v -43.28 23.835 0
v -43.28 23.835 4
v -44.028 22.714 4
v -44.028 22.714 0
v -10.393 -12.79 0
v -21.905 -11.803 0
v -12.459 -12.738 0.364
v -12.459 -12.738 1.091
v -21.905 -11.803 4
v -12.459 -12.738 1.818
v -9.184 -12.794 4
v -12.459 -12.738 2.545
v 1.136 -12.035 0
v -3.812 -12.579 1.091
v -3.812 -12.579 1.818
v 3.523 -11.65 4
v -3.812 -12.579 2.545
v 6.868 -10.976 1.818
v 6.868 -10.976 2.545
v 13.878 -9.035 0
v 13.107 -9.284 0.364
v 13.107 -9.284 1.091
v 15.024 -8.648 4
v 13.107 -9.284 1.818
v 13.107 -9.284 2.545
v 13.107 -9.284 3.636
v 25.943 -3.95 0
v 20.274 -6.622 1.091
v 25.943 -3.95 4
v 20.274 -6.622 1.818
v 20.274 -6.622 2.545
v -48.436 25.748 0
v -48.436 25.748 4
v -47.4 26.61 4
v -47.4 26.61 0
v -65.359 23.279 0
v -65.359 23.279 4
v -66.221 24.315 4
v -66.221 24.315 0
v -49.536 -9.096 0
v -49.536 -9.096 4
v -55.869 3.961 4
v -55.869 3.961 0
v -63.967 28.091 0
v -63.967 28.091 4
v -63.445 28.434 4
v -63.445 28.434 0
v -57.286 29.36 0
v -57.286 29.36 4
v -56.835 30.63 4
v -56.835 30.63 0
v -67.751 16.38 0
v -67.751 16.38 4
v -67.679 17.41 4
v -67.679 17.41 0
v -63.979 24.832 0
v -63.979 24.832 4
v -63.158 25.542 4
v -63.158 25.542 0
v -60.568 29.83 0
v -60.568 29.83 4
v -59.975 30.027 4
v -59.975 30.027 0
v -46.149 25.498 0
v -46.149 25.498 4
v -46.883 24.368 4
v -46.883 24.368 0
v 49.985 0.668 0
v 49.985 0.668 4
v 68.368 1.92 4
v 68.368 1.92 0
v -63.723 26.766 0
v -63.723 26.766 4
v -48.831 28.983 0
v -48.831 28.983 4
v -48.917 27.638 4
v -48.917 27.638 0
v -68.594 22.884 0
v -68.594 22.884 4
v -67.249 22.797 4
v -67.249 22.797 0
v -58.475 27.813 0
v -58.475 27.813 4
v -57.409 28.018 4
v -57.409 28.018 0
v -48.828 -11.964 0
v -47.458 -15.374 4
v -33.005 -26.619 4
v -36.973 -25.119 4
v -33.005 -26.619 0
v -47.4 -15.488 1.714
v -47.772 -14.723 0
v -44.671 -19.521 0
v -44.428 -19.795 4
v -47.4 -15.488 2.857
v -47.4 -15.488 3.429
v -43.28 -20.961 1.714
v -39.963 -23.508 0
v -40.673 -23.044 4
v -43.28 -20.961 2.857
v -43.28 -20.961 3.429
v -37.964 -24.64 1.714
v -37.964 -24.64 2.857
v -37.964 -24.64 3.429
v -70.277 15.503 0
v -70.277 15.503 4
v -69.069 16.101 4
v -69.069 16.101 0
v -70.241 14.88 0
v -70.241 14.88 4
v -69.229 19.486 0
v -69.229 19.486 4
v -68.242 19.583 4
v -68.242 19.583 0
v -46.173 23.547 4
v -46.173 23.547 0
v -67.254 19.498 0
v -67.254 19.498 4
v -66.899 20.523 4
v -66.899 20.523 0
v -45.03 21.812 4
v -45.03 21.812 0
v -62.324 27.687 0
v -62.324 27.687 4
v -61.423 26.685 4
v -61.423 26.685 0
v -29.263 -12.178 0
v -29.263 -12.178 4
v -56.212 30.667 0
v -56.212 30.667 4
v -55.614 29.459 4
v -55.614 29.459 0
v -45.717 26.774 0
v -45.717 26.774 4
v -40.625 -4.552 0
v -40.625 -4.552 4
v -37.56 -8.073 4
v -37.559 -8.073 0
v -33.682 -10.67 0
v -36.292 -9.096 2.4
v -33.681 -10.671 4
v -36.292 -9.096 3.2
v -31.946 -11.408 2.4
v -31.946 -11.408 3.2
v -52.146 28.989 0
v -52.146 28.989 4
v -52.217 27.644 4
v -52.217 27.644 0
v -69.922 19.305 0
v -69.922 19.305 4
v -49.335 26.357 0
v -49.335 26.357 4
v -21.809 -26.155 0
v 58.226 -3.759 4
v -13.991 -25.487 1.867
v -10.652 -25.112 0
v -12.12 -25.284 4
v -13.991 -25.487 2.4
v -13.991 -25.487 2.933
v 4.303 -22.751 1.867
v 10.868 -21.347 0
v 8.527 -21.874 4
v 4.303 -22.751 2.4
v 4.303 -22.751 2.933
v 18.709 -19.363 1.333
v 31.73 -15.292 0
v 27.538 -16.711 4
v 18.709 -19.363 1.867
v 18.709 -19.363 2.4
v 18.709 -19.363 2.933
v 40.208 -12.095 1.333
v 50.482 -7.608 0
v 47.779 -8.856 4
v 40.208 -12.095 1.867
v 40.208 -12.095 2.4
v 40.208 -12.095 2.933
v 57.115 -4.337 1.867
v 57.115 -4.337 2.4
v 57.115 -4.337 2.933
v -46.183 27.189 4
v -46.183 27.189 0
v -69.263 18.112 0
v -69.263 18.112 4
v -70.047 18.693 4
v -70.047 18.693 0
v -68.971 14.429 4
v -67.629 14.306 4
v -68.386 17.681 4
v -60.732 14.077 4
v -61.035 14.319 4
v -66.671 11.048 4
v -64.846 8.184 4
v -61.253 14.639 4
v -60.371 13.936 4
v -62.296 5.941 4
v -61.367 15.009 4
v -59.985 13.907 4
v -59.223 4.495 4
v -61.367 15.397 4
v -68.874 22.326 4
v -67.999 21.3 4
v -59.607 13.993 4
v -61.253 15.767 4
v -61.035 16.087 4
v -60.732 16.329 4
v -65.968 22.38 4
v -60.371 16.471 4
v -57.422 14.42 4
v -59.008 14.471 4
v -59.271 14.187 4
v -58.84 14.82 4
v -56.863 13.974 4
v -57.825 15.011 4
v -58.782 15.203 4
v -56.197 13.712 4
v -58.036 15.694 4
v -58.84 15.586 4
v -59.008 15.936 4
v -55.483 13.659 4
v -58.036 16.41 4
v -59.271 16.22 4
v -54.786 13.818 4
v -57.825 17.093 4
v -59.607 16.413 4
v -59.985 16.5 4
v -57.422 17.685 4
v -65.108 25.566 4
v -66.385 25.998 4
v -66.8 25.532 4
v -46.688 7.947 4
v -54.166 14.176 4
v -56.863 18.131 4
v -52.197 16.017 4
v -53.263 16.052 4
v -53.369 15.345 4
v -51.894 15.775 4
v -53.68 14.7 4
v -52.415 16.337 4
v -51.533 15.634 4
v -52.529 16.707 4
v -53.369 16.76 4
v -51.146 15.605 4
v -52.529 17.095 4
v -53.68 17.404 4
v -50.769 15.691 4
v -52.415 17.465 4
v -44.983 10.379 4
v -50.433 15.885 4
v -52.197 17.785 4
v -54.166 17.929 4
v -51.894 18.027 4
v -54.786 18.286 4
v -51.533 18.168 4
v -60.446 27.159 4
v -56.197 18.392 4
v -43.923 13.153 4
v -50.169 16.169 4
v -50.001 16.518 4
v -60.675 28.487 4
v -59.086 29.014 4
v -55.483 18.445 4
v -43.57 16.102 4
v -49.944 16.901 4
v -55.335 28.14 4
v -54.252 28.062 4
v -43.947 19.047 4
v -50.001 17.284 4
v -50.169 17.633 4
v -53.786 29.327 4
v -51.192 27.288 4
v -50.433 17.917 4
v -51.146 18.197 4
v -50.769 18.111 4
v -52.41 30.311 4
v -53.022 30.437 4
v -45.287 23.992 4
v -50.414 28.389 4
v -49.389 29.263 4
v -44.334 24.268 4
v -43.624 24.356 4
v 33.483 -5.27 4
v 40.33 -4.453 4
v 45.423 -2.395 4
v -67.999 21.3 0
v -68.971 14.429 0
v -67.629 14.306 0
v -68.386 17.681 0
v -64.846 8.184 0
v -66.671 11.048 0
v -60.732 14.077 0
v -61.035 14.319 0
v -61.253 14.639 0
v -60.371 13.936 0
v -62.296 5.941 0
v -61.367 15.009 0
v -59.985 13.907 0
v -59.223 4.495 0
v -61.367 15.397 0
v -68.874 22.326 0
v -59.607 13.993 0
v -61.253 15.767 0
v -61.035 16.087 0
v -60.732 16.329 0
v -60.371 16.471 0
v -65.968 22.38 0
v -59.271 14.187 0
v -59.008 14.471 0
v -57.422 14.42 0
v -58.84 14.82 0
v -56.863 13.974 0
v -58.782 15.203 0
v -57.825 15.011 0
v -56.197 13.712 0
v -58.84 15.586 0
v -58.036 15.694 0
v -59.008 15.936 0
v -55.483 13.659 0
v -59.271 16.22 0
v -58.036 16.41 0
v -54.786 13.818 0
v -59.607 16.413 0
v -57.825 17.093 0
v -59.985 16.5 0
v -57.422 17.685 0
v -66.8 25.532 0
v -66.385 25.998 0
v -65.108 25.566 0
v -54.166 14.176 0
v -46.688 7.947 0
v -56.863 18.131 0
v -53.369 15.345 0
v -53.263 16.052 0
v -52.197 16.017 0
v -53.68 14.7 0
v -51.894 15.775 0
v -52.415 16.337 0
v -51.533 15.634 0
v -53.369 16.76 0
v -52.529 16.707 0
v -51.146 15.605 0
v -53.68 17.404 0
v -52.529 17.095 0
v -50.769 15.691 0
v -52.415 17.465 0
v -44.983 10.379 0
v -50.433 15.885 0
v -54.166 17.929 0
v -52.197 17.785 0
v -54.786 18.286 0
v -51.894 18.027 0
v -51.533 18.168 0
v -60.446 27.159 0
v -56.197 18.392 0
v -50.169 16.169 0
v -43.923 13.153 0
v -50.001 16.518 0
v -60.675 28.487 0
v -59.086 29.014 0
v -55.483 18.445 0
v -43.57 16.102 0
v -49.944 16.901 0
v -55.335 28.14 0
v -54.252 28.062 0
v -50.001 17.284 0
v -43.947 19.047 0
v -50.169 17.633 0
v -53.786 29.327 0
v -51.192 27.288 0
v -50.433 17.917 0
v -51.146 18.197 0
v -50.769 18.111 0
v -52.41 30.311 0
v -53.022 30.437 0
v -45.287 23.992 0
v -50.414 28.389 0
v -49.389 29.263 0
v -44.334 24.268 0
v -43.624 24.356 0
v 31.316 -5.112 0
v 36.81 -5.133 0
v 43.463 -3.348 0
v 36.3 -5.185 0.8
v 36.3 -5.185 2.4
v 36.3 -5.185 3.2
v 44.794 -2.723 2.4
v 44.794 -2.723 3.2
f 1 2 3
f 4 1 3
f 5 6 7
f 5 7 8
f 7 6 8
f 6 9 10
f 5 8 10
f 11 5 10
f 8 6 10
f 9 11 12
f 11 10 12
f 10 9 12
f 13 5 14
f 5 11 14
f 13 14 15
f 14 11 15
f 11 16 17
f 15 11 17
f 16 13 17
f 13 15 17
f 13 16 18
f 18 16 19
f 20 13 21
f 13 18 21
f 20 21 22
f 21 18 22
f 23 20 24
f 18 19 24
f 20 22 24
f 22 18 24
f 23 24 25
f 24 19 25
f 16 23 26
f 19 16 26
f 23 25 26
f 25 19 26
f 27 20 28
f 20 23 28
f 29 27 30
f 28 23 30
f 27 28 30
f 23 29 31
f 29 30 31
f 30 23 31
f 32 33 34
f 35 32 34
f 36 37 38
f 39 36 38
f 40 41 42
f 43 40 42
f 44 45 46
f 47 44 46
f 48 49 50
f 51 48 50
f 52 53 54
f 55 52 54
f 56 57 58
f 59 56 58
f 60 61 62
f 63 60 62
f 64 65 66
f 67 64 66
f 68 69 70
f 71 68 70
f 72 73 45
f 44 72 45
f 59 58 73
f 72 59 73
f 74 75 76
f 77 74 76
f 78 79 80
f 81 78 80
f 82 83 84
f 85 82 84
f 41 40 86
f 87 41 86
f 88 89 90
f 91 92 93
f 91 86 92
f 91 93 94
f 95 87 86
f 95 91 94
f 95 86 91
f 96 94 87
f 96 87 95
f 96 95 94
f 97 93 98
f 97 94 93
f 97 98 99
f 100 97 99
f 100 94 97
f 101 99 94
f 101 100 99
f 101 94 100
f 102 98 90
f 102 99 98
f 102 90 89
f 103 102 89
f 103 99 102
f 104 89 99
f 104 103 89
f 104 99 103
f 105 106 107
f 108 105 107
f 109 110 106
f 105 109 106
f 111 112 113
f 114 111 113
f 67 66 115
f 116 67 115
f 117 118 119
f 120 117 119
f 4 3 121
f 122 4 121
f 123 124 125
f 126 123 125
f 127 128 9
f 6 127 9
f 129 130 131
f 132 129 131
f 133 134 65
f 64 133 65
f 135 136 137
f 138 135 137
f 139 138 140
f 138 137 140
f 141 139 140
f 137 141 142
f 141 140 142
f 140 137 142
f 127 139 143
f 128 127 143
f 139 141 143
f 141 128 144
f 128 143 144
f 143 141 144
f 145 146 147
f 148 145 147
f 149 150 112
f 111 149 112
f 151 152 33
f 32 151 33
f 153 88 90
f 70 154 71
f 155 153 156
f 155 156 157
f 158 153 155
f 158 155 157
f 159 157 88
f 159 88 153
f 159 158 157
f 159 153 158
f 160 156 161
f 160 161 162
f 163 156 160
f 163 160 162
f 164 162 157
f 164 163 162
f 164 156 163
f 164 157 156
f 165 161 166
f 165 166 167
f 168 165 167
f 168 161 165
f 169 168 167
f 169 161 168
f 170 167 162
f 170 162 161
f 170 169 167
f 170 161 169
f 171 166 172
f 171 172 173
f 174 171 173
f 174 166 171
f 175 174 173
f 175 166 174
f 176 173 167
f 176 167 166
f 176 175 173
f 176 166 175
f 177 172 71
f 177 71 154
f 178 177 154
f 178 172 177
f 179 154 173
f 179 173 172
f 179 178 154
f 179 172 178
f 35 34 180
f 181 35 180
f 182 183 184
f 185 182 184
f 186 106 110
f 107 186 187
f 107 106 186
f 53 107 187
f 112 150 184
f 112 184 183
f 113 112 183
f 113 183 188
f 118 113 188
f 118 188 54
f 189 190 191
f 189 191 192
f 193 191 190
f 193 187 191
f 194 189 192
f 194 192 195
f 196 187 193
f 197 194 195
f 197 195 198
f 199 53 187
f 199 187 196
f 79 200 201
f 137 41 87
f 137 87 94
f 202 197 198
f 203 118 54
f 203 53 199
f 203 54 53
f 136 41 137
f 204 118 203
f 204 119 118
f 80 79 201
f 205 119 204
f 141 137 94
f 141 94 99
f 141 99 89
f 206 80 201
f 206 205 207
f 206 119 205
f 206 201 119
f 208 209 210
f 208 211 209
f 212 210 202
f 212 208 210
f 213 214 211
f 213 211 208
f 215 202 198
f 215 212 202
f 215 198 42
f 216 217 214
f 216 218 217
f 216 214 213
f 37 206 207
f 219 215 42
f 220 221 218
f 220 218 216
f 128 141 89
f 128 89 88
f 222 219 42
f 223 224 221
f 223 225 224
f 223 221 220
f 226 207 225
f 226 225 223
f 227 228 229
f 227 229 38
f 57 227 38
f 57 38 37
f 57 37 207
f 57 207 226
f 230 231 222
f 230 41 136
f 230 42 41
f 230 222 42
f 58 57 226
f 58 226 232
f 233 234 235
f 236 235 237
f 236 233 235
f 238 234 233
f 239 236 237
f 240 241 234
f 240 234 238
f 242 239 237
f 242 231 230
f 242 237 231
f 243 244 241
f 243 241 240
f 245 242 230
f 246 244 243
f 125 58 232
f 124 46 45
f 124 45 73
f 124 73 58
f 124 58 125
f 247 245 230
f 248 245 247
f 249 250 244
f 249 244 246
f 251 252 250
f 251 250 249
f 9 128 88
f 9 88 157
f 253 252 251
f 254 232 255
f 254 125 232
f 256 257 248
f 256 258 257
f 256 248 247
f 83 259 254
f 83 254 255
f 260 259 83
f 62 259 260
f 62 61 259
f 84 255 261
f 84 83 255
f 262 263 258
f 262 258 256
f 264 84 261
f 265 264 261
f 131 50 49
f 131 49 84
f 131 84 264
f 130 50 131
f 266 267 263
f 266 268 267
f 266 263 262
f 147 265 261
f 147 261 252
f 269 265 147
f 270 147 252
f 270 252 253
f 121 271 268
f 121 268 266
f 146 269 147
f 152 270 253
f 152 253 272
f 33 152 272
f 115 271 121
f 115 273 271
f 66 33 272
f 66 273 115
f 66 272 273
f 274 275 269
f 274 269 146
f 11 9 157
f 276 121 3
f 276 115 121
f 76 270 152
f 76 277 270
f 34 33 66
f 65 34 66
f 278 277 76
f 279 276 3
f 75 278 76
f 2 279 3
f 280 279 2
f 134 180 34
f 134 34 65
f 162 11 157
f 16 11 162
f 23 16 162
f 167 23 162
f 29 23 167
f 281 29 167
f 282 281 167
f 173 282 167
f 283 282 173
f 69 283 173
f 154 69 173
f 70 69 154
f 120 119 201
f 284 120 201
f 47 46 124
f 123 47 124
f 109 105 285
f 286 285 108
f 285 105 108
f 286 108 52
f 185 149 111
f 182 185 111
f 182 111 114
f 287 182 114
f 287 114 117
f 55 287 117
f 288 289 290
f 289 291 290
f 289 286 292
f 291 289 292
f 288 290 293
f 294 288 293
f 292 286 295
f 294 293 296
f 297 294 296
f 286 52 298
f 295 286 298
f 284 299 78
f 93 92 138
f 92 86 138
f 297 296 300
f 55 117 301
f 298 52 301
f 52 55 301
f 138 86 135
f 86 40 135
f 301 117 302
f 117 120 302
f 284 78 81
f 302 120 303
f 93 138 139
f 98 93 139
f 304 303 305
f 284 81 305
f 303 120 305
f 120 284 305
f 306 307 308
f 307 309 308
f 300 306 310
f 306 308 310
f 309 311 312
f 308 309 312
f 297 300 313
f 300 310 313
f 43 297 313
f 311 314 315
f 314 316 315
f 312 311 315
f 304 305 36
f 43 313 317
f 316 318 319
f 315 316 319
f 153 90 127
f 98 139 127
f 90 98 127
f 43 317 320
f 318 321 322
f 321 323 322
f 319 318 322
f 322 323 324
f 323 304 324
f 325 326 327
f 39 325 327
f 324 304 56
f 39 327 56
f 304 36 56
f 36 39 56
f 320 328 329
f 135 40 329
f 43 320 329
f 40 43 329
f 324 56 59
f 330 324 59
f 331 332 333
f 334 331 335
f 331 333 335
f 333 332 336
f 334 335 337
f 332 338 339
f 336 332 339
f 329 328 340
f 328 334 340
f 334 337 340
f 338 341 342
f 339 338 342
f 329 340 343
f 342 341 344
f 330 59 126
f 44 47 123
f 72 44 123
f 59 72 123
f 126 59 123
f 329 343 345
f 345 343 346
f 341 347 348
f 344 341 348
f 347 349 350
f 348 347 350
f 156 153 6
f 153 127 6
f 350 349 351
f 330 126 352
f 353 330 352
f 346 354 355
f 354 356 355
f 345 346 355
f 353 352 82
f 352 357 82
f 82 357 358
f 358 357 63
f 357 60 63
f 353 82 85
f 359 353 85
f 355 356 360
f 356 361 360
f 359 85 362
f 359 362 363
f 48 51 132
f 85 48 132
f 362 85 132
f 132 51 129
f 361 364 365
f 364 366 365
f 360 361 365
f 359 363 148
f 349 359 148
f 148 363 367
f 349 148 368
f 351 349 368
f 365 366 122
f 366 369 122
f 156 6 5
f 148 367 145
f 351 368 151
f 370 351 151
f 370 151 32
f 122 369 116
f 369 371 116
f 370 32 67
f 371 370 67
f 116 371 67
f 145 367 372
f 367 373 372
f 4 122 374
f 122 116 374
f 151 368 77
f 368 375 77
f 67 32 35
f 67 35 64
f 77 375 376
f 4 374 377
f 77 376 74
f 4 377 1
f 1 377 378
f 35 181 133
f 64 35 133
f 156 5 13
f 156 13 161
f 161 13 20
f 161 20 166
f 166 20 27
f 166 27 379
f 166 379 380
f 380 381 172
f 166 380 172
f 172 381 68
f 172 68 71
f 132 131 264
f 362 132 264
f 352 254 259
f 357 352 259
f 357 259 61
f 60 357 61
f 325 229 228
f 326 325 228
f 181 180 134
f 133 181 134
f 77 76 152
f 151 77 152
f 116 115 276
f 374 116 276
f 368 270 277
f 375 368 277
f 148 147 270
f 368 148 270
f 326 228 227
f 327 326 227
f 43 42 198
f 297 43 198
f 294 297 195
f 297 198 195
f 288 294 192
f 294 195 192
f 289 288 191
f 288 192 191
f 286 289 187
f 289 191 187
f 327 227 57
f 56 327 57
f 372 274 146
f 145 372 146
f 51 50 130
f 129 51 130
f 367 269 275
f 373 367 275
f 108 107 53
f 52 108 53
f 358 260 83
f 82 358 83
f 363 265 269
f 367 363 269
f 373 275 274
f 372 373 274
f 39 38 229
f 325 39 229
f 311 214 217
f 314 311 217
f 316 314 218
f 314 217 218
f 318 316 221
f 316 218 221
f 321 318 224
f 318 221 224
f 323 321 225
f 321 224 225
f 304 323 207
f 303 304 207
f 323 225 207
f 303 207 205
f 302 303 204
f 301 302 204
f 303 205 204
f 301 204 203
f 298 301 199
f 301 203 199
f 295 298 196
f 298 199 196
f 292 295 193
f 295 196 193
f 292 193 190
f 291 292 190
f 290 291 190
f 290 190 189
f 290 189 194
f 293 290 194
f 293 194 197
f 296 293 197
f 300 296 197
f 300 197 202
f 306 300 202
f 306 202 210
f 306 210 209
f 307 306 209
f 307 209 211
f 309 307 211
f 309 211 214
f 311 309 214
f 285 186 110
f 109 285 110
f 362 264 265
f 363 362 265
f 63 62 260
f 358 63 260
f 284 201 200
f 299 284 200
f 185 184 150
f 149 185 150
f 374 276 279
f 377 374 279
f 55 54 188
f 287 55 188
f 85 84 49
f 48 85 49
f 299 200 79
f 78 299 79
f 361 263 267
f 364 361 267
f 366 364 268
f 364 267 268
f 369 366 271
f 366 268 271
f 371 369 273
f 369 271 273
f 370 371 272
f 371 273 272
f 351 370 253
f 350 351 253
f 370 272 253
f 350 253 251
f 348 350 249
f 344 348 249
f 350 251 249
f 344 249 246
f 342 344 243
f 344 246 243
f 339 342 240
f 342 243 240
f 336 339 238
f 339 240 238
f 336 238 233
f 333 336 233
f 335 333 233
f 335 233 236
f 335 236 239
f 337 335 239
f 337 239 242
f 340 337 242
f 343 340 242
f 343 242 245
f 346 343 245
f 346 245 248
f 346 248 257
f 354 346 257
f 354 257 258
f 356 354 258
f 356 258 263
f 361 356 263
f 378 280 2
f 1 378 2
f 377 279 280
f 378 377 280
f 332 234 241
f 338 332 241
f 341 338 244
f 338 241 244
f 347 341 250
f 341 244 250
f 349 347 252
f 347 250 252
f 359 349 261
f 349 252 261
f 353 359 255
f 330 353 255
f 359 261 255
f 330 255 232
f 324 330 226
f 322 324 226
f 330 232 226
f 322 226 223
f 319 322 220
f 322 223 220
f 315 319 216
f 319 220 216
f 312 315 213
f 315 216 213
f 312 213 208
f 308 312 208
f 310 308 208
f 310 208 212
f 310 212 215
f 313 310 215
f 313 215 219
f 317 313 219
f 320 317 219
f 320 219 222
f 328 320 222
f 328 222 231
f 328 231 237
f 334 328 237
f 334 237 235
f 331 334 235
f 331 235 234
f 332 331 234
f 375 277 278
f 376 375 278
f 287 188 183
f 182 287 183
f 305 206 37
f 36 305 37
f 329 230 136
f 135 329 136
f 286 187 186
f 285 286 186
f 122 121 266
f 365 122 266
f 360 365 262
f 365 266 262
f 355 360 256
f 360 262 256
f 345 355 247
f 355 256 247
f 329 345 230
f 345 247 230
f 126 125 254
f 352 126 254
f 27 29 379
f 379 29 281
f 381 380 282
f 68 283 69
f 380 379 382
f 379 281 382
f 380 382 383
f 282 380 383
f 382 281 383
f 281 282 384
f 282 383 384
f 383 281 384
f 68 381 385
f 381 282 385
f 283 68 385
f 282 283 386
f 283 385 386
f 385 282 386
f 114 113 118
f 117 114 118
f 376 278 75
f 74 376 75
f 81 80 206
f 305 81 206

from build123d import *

# Parameters (mm, degrees)
SKETCH1_W           = 150
SKETCH1_H           = 70
BOSS_EXTRUDE1_DEPTH = 4
SKETCH2_W           = 150
SKETCH2_H           = 70
SKETCH2_R           = 1.3
SKETCH2_R_2         = 2.4
CUT_EXTRUDE1_DEPTH  = 10


with BuildPart() as part:
    # Sketch1 → Boss-Extrude1 (new body)
    with BuildSketch(Plane.XY):
        Rectangle(SKETCH1_W, SKETCH1_H)
    extrude(amount=BOSS_EXTRUDE1_DEPTH)

    # Sketch2 → Cut-Extrude1 (cut)
    # profile 1 of 4: a face of its own
    with BuildSketch(Plane.XY.offset(4)):
        Rectangle(SKETCH2_W, SKETCH2_H)
        with BuildLine():
            add(Edge.make_bspline(
                [(25.943186653, -3.950471355), (27.846969269, -4.547232813), (31.287122421, -5.290525852), (36.735640075, -5.338112806), (41.143250704, -4.366496225), (45.771671446, -2.369991596), (48.378055128, -0.634767364), (49.984542654, 0.667670418)],
                knots=[0, 0, 0, 0, 0.234141345, 0.410073985, 0.635494837, 0.757255977, 1, 1, 1, 1], degree=3))
            Line((49.984542654, 0.667670418), (68.368403063, 1.920292741))
            add(Edge.make_bspline(
                [(-33.004955139, -26.618623378), (-30.294523128, -26.574879913), (-25.880509709, -26.423954366), (-19.54201722, -26.014521717), (-14.319937046, -25.543432562), (-8.998131049, -24.92772797), (-2.890101028, -24.067514059), (4.364427962, -22.796901426), (11.870157255, -21.159659498), (19.827939937, -19.110263295), (26.884456831, -16.979260605), (34.037553038, -14.503385048), (39.936366025, -12.243402206), (45.782494162, -9.778756125), (51.423398212, -7.197801789), (59.009760326, -3.437427178), (64.682537278, -0.280517491), (68.368403063, 1.920292741)],
                knots=[0, 0, 0, 0, 0.076324938, 0.124331496, 0.178823517, 0.223936737, 0.275160112, 0.352480577, 0.431247301, 0.491394905, 0.583819579, 0.638693956, 0.704497251, 0.761639539, 0.81730198, 0.879134072, 1, 1, 1, 1], degree=3))
            add(Edge.make_bspline(
                [(-49.535748672, -9.096126268), (-49.339830369, -10.137896023), (-48.797352048, -12.328019472), (-47.539705157, -15.420109206), (-45.707187417, -18.401147763), (-43.54343584, -20.831673927), (-40.91315221, -22.974076428), (-37.51630052, -25.005074849), (-34.707117005, -26.096270898), (-33.004955139, -26.618623378)],
                knots=[0, 0, 0, 0, 0.124884489, 0.26543712, 0.391415345, 0.535530604, 0.646519487, 0.79009791, 1, 1, 1, 1], degree=3))
            Line((-49.535748672, -9.096126268), (-55.868573385, 3.961128214))
            ThreePointArc((-55.868573385, 3.961128214), (-63.649841308, 6.972432766), (-67.628790007, 14.306193932))
            Line((-67.628790007, 14.306193932), (-68.970840738, 14.428927947))
            Line((-68.970840738, 14.428927947), (-70.240707474, 14.880151039))
            Line((-70.240707474, 14.880151039), (-70.277437725, 15.5032436))
            Line((-70.277437725, 15.5032436), (-69.069379214, 16.10053619))
            Line((-69.069379214, 16.10053619), (-67.751042994, 16.380095513))
            Line((-67.751042994, 16.380095513), (-67.679030495, 17.409843403))
            Line((-67.679030495, 17.409843403), (-68.386470931, 17.681135001))
            Line((-68.386470931, 17.681135001), (-69.26282403, 18.111750468))
            Line((-69.26282403, 18.111750468), (-70.047304849, 18.693140424))
            Line((-70.047304849, 18.693140424), (-69.921515326, 19.304508109))
            Line((-69.921515326, 19.304508109), (-69.22879013, 19.48592239))
            Line((-69.22879013, 19.48592239), (-68.242063209, 19.582780663))
            Line((-68.242063209, 19.582780663), (-67.254259433, 19.497602945))
            Line((-67.254259433, 19.497602945), (-66.898609662, 20.523128894))
            Line((-66.898609662, 20.523128894), (-67.999492681, 21.300445035))
            Line((-67.999492681, 21.300445035), (-68.873617988, 22.326149063))
            Line((-68.873617988, 22.326149063), (-68.593881038, 22.884128176))
            Line((-68.593881038, 22.884128176), (-67.249025383, 22.797369477))
            Line((-67.249025383, 22.797369477), (-65.967533065, 22.380306842))
            Line((-65.967533065, 22.380306842), (-65.358576119, 23.278839907))
            Line((-65.358576119, 23.278839907), (-66.220763237, 24.314599134))
            Line((-66.220763237, 24.314599134), (-66.799631709, 25.531593422))
            Line((-66.799631709, 25.531593422), (-66.385010944, 25.998158608))
            Line((-66.385010944, 25.998158608), (-65.108434938, 25.566281883))
            Line((-65.108434938, 25.566281883), (-63.978552164, 24.831755694))
            Line((-63.978552164, 24.831755694), (-63.157787454, 25.542062333))
            Line((-63.157787454, 25.542062333), (-63.722522044, 26.765679367))
            Line((-63.722522044, 26.765679367), (-63.966684751, 28.091027765))
            Line((-63.966684751, 28.091027765), (-63.44543589, 28.434383377))
            Line((-63.44543589, 28.434383377), (-62.324136078, 27.686820312))
            Line((-62.324136078, 27.686820312), (-61.422862493, 26.684887316))
            Line((-61.422862493, 26.684887316), (-60.446223776, 27.158561304))
            Line((-60.446223776, 27.158561304), (-60.675020109, 28.486648666))
            Line((-60.675020109, 28.486648666), (-60.567837768, 29.830030872))
            Line((-60.567837768, 29.830030872), (-59.975483059, 30.026777792))
            Line((-59.975483059, 30.026777792), (-59.08587417, 29.014473574))
            Line((-59.08587417, 29.014473574), (-58.474630079, 27.813413848))
            Line((-58.474630079, 27.813413848), (-57.40867367, 28.018175086))
            Line((-57.40867367, 28.018175086), (-57.285939655, 29.360225818))
            Line((-57.285939655, 29.360225818), (-56.834716563, 30.630092553))
            Line((-56.834716563, 30.630092553), (-56.211624002, 30.666822805))
            Line((-56.211624002, 30.666822805), (-55.614331412, 29.458764294))
            Line((-55.614331412, 29.458764294), (-55.334772089, 28.140428074))
            Line((-55.334772089, 28.140428074), (-54.252141156, 28.062322422))
            Line((-54.252141156, 28.062322422), (-53.786240912, 29.326877983))
            Line((-53.786240912, 29.326877983), (-53.021727178, 30.436689929))
            Line((-53.021727178, 30.436689929), (-52.410359493, 30.310900406))
            Line((-52.410359493, 30.310900406), (-52.146087704, 28.989414792))
            Line((-52.146087704, 28.989414792), (-52.217264657, 27.643644513))
            Line((-52.217264657, 27.643644513), (-51.191738708, 27.287994742))
            Line((-51.191738708, 27.287994742), (-50.414422567, 28.388877761))
            Line((-50.414422567, 28.388877761), (-49.388718539, 29.263003067))
            Line((-49.388718539, 29.263003067), (-48.830739426, 28.983266117))
            Line((-48.830739426, 28.983266117), (-48.917498125, 27.638410463))
            Line((-48.917498125, 27.638410463), (-49.33456076, 26.356918144))
            Line((-49.33456076, 26.356918144), (-48.436027695, 25.747961199))
            Line((-48.436027695, 25.747961199), (-47.400268467, 26.610148317))
            Line((-47.400268467, 26.610148317), (-46.18327418, 27.189016789))
            Line((-46.18327418, 27.189016789), (-45.716708994, 26.774396023))
            Line((-45.716708994, 26.774396023), (-46.148585719, 25.497820017))
            Line((-46.148585719, 25.497820017), (-46.883111907, 24.367937244))
            Line((-46.883111907, 24.367937244), (-46.172805269, 23.547172533))
            Line((-46.172805269, 23.547172533), (-45.286864939, 23.992280694))
            Line((-45.286864939, 23.992280694), (-44.334478382, 24.26790977))
            Line((-44.334478382, 24.26790977), (-43.623839837, 24.356069831))
            Line((-43.623839837, 24.356069831), (-43.280484225, 23.83482097))
            Line((-43.280484225, 23.83482097), (-44.02804729, 22.713521158))
            Line((-44.02804729, 22.713521158), (-45.029980286, 21.812247573))
            ThreePointArc((-45.029980286, 21.812247573), (-43.655526666, 14.616368623), (-46.687860181, 7.947429421))
            Line((-46.687860181, 7.947429421), (-40.625414849, -4.552346756))
            add(Edge.make_bspline(
                [(-40.625414849, -4.552346756), (-39.969724138, -5.518615353), (-38.642033006, -7.159979255), (-36.383256782, -9.119344727), (-34.181437855, -10.482492748), (-31.814725419, -11.517519607), (-30.173224961, -11.982812896), (-29.2632985, -12.178103902)],
                knots=[0, 0, 0, 0, 0.249608299, 0.449336056, 0.636249607, 0.801036873, 1, 1, 1, 1], degree=3))
            Line((-29.2632985, -12.178103902), (-21.905328426, -11.80268597))
            add(Edge.make_bspline(
                [(-21.905328426, -11.80268597), (-20.310852996, -12.055092712), (-17.169889797, -12.459787879), (-12.483928013, -12.782767249), (-8.045859096, -12.82243272), (-3.649062985, -12.608578219), (1.283313279, -12.08050338), (5.938716144, -11.233581759), (10.05540984, -10.206537199), (13.081948519, -9.312895411), (16.474512339, -8.1639354), (20.793643696, -6.464082533), (24.086370836, -4.909244471), (25.943186653, -3.950471355)],
                knots=[0, 0, 0, 0, 0.098157301, 0.192485818, 0.285432427, 0.367865586, 0.460021268, 0.586889267, 0.655198895, 0.717943591, 0.778718956, 0.872950297, 1, 1, 1, 1], degree=3))
        make_face(mode=Mode.SUBTRACT)
    # profile 2 of 4: a face of its own
    with BuildSketch(Plane.XY.offset(4)):
        with Locations((-60.081947299, 15.203234123)):
            Circle(SKETCH2_R)
    # profile 3 of 4: a face of its own
    with BuildSketch(Plane.XY.offset(4)):
        with Locations((-51.243535224, 16.901018558)):
            Circle(SKETCH2_R)
    # profile 4 of 4: a face of its own
    with BuildSketch(Plane.XY.offset(4)):
        with Locations((-55.662741261, 16.052126341)):
            Circle(SKETCH2_R_2)
    extrude(amount=-CUT_EXTRUDE1_DEPTH, mode=Mode.SUBTRACT)


solid = part.part
